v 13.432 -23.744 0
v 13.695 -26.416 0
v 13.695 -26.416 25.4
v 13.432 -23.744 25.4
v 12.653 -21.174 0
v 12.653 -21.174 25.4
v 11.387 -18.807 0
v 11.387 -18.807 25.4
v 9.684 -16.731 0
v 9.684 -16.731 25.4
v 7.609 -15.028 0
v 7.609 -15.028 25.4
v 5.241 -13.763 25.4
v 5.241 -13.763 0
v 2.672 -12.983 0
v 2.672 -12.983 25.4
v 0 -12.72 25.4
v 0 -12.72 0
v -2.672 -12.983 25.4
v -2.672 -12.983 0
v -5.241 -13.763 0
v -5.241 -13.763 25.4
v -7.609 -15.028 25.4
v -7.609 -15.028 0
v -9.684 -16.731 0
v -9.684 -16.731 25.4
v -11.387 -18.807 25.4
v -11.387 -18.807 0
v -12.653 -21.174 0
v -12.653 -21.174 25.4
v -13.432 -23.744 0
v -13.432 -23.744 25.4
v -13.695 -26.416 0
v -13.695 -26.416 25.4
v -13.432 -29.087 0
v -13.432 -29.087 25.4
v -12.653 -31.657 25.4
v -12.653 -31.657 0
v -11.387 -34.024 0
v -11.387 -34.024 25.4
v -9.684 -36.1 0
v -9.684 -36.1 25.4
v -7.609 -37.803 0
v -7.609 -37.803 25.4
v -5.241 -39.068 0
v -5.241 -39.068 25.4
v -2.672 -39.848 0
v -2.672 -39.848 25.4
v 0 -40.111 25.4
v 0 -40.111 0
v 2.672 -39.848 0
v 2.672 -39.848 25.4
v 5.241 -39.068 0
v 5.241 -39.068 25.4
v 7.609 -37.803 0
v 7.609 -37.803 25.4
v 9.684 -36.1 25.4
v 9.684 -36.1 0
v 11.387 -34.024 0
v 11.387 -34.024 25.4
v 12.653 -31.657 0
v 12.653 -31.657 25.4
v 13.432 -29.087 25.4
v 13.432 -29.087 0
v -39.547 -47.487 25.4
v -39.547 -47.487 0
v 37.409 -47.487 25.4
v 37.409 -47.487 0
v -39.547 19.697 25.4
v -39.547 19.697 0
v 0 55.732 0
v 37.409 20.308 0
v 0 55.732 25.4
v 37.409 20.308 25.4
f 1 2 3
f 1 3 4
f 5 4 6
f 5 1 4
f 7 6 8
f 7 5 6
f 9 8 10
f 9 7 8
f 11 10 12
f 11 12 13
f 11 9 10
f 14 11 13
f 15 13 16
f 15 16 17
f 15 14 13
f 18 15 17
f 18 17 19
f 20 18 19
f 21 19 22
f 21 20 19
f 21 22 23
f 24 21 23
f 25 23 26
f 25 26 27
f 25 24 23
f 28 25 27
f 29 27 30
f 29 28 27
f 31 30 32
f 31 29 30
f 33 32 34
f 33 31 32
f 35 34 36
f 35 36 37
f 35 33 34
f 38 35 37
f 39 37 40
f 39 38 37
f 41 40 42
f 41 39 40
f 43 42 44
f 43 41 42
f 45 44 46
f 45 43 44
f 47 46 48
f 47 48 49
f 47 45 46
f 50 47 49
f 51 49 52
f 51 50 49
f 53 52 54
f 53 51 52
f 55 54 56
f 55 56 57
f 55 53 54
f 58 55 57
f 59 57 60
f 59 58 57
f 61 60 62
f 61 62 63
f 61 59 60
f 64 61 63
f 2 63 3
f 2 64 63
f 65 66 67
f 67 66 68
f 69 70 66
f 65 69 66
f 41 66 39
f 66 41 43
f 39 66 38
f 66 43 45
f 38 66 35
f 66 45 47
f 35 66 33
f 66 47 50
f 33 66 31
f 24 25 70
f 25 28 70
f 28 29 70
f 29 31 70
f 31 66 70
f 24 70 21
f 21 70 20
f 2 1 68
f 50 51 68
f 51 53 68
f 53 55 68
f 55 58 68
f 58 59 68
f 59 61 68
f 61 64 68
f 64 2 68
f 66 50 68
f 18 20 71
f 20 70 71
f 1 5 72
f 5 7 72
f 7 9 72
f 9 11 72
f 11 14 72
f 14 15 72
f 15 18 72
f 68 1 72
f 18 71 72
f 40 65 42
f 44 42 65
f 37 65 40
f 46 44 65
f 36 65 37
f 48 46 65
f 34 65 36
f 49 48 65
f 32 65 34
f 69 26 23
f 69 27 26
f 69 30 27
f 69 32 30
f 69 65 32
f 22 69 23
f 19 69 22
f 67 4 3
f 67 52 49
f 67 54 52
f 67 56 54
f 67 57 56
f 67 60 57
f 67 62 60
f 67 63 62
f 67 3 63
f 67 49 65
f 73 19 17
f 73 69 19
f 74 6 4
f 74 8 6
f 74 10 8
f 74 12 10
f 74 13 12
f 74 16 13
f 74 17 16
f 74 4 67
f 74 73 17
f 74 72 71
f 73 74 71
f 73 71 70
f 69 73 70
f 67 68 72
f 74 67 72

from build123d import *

# Parameters (mm, degrees)
F0_R     = 13.69544
F1_DEPTH = 25.4


with BuildPart() as f1:
    # F0 (on Top) → F1 (new body)
    with BuildSketch(Plane.XY):
        Polygon((0, 55.732161), (-39.546929, 19.697119), (37.409257, 20.307882), align=None)
        Polygon((-39.546929, 19.697119), (-39.546929, -47.486853), (37.409257, -47.486853), (37.409257, 20.307882), align=None)
        with Locations((0, -26.415514)):
            Circle(F0_R, mode=Mode.SUBTRACT)
    extrude(amount=F1_DEPTH)


solid = f1.part
